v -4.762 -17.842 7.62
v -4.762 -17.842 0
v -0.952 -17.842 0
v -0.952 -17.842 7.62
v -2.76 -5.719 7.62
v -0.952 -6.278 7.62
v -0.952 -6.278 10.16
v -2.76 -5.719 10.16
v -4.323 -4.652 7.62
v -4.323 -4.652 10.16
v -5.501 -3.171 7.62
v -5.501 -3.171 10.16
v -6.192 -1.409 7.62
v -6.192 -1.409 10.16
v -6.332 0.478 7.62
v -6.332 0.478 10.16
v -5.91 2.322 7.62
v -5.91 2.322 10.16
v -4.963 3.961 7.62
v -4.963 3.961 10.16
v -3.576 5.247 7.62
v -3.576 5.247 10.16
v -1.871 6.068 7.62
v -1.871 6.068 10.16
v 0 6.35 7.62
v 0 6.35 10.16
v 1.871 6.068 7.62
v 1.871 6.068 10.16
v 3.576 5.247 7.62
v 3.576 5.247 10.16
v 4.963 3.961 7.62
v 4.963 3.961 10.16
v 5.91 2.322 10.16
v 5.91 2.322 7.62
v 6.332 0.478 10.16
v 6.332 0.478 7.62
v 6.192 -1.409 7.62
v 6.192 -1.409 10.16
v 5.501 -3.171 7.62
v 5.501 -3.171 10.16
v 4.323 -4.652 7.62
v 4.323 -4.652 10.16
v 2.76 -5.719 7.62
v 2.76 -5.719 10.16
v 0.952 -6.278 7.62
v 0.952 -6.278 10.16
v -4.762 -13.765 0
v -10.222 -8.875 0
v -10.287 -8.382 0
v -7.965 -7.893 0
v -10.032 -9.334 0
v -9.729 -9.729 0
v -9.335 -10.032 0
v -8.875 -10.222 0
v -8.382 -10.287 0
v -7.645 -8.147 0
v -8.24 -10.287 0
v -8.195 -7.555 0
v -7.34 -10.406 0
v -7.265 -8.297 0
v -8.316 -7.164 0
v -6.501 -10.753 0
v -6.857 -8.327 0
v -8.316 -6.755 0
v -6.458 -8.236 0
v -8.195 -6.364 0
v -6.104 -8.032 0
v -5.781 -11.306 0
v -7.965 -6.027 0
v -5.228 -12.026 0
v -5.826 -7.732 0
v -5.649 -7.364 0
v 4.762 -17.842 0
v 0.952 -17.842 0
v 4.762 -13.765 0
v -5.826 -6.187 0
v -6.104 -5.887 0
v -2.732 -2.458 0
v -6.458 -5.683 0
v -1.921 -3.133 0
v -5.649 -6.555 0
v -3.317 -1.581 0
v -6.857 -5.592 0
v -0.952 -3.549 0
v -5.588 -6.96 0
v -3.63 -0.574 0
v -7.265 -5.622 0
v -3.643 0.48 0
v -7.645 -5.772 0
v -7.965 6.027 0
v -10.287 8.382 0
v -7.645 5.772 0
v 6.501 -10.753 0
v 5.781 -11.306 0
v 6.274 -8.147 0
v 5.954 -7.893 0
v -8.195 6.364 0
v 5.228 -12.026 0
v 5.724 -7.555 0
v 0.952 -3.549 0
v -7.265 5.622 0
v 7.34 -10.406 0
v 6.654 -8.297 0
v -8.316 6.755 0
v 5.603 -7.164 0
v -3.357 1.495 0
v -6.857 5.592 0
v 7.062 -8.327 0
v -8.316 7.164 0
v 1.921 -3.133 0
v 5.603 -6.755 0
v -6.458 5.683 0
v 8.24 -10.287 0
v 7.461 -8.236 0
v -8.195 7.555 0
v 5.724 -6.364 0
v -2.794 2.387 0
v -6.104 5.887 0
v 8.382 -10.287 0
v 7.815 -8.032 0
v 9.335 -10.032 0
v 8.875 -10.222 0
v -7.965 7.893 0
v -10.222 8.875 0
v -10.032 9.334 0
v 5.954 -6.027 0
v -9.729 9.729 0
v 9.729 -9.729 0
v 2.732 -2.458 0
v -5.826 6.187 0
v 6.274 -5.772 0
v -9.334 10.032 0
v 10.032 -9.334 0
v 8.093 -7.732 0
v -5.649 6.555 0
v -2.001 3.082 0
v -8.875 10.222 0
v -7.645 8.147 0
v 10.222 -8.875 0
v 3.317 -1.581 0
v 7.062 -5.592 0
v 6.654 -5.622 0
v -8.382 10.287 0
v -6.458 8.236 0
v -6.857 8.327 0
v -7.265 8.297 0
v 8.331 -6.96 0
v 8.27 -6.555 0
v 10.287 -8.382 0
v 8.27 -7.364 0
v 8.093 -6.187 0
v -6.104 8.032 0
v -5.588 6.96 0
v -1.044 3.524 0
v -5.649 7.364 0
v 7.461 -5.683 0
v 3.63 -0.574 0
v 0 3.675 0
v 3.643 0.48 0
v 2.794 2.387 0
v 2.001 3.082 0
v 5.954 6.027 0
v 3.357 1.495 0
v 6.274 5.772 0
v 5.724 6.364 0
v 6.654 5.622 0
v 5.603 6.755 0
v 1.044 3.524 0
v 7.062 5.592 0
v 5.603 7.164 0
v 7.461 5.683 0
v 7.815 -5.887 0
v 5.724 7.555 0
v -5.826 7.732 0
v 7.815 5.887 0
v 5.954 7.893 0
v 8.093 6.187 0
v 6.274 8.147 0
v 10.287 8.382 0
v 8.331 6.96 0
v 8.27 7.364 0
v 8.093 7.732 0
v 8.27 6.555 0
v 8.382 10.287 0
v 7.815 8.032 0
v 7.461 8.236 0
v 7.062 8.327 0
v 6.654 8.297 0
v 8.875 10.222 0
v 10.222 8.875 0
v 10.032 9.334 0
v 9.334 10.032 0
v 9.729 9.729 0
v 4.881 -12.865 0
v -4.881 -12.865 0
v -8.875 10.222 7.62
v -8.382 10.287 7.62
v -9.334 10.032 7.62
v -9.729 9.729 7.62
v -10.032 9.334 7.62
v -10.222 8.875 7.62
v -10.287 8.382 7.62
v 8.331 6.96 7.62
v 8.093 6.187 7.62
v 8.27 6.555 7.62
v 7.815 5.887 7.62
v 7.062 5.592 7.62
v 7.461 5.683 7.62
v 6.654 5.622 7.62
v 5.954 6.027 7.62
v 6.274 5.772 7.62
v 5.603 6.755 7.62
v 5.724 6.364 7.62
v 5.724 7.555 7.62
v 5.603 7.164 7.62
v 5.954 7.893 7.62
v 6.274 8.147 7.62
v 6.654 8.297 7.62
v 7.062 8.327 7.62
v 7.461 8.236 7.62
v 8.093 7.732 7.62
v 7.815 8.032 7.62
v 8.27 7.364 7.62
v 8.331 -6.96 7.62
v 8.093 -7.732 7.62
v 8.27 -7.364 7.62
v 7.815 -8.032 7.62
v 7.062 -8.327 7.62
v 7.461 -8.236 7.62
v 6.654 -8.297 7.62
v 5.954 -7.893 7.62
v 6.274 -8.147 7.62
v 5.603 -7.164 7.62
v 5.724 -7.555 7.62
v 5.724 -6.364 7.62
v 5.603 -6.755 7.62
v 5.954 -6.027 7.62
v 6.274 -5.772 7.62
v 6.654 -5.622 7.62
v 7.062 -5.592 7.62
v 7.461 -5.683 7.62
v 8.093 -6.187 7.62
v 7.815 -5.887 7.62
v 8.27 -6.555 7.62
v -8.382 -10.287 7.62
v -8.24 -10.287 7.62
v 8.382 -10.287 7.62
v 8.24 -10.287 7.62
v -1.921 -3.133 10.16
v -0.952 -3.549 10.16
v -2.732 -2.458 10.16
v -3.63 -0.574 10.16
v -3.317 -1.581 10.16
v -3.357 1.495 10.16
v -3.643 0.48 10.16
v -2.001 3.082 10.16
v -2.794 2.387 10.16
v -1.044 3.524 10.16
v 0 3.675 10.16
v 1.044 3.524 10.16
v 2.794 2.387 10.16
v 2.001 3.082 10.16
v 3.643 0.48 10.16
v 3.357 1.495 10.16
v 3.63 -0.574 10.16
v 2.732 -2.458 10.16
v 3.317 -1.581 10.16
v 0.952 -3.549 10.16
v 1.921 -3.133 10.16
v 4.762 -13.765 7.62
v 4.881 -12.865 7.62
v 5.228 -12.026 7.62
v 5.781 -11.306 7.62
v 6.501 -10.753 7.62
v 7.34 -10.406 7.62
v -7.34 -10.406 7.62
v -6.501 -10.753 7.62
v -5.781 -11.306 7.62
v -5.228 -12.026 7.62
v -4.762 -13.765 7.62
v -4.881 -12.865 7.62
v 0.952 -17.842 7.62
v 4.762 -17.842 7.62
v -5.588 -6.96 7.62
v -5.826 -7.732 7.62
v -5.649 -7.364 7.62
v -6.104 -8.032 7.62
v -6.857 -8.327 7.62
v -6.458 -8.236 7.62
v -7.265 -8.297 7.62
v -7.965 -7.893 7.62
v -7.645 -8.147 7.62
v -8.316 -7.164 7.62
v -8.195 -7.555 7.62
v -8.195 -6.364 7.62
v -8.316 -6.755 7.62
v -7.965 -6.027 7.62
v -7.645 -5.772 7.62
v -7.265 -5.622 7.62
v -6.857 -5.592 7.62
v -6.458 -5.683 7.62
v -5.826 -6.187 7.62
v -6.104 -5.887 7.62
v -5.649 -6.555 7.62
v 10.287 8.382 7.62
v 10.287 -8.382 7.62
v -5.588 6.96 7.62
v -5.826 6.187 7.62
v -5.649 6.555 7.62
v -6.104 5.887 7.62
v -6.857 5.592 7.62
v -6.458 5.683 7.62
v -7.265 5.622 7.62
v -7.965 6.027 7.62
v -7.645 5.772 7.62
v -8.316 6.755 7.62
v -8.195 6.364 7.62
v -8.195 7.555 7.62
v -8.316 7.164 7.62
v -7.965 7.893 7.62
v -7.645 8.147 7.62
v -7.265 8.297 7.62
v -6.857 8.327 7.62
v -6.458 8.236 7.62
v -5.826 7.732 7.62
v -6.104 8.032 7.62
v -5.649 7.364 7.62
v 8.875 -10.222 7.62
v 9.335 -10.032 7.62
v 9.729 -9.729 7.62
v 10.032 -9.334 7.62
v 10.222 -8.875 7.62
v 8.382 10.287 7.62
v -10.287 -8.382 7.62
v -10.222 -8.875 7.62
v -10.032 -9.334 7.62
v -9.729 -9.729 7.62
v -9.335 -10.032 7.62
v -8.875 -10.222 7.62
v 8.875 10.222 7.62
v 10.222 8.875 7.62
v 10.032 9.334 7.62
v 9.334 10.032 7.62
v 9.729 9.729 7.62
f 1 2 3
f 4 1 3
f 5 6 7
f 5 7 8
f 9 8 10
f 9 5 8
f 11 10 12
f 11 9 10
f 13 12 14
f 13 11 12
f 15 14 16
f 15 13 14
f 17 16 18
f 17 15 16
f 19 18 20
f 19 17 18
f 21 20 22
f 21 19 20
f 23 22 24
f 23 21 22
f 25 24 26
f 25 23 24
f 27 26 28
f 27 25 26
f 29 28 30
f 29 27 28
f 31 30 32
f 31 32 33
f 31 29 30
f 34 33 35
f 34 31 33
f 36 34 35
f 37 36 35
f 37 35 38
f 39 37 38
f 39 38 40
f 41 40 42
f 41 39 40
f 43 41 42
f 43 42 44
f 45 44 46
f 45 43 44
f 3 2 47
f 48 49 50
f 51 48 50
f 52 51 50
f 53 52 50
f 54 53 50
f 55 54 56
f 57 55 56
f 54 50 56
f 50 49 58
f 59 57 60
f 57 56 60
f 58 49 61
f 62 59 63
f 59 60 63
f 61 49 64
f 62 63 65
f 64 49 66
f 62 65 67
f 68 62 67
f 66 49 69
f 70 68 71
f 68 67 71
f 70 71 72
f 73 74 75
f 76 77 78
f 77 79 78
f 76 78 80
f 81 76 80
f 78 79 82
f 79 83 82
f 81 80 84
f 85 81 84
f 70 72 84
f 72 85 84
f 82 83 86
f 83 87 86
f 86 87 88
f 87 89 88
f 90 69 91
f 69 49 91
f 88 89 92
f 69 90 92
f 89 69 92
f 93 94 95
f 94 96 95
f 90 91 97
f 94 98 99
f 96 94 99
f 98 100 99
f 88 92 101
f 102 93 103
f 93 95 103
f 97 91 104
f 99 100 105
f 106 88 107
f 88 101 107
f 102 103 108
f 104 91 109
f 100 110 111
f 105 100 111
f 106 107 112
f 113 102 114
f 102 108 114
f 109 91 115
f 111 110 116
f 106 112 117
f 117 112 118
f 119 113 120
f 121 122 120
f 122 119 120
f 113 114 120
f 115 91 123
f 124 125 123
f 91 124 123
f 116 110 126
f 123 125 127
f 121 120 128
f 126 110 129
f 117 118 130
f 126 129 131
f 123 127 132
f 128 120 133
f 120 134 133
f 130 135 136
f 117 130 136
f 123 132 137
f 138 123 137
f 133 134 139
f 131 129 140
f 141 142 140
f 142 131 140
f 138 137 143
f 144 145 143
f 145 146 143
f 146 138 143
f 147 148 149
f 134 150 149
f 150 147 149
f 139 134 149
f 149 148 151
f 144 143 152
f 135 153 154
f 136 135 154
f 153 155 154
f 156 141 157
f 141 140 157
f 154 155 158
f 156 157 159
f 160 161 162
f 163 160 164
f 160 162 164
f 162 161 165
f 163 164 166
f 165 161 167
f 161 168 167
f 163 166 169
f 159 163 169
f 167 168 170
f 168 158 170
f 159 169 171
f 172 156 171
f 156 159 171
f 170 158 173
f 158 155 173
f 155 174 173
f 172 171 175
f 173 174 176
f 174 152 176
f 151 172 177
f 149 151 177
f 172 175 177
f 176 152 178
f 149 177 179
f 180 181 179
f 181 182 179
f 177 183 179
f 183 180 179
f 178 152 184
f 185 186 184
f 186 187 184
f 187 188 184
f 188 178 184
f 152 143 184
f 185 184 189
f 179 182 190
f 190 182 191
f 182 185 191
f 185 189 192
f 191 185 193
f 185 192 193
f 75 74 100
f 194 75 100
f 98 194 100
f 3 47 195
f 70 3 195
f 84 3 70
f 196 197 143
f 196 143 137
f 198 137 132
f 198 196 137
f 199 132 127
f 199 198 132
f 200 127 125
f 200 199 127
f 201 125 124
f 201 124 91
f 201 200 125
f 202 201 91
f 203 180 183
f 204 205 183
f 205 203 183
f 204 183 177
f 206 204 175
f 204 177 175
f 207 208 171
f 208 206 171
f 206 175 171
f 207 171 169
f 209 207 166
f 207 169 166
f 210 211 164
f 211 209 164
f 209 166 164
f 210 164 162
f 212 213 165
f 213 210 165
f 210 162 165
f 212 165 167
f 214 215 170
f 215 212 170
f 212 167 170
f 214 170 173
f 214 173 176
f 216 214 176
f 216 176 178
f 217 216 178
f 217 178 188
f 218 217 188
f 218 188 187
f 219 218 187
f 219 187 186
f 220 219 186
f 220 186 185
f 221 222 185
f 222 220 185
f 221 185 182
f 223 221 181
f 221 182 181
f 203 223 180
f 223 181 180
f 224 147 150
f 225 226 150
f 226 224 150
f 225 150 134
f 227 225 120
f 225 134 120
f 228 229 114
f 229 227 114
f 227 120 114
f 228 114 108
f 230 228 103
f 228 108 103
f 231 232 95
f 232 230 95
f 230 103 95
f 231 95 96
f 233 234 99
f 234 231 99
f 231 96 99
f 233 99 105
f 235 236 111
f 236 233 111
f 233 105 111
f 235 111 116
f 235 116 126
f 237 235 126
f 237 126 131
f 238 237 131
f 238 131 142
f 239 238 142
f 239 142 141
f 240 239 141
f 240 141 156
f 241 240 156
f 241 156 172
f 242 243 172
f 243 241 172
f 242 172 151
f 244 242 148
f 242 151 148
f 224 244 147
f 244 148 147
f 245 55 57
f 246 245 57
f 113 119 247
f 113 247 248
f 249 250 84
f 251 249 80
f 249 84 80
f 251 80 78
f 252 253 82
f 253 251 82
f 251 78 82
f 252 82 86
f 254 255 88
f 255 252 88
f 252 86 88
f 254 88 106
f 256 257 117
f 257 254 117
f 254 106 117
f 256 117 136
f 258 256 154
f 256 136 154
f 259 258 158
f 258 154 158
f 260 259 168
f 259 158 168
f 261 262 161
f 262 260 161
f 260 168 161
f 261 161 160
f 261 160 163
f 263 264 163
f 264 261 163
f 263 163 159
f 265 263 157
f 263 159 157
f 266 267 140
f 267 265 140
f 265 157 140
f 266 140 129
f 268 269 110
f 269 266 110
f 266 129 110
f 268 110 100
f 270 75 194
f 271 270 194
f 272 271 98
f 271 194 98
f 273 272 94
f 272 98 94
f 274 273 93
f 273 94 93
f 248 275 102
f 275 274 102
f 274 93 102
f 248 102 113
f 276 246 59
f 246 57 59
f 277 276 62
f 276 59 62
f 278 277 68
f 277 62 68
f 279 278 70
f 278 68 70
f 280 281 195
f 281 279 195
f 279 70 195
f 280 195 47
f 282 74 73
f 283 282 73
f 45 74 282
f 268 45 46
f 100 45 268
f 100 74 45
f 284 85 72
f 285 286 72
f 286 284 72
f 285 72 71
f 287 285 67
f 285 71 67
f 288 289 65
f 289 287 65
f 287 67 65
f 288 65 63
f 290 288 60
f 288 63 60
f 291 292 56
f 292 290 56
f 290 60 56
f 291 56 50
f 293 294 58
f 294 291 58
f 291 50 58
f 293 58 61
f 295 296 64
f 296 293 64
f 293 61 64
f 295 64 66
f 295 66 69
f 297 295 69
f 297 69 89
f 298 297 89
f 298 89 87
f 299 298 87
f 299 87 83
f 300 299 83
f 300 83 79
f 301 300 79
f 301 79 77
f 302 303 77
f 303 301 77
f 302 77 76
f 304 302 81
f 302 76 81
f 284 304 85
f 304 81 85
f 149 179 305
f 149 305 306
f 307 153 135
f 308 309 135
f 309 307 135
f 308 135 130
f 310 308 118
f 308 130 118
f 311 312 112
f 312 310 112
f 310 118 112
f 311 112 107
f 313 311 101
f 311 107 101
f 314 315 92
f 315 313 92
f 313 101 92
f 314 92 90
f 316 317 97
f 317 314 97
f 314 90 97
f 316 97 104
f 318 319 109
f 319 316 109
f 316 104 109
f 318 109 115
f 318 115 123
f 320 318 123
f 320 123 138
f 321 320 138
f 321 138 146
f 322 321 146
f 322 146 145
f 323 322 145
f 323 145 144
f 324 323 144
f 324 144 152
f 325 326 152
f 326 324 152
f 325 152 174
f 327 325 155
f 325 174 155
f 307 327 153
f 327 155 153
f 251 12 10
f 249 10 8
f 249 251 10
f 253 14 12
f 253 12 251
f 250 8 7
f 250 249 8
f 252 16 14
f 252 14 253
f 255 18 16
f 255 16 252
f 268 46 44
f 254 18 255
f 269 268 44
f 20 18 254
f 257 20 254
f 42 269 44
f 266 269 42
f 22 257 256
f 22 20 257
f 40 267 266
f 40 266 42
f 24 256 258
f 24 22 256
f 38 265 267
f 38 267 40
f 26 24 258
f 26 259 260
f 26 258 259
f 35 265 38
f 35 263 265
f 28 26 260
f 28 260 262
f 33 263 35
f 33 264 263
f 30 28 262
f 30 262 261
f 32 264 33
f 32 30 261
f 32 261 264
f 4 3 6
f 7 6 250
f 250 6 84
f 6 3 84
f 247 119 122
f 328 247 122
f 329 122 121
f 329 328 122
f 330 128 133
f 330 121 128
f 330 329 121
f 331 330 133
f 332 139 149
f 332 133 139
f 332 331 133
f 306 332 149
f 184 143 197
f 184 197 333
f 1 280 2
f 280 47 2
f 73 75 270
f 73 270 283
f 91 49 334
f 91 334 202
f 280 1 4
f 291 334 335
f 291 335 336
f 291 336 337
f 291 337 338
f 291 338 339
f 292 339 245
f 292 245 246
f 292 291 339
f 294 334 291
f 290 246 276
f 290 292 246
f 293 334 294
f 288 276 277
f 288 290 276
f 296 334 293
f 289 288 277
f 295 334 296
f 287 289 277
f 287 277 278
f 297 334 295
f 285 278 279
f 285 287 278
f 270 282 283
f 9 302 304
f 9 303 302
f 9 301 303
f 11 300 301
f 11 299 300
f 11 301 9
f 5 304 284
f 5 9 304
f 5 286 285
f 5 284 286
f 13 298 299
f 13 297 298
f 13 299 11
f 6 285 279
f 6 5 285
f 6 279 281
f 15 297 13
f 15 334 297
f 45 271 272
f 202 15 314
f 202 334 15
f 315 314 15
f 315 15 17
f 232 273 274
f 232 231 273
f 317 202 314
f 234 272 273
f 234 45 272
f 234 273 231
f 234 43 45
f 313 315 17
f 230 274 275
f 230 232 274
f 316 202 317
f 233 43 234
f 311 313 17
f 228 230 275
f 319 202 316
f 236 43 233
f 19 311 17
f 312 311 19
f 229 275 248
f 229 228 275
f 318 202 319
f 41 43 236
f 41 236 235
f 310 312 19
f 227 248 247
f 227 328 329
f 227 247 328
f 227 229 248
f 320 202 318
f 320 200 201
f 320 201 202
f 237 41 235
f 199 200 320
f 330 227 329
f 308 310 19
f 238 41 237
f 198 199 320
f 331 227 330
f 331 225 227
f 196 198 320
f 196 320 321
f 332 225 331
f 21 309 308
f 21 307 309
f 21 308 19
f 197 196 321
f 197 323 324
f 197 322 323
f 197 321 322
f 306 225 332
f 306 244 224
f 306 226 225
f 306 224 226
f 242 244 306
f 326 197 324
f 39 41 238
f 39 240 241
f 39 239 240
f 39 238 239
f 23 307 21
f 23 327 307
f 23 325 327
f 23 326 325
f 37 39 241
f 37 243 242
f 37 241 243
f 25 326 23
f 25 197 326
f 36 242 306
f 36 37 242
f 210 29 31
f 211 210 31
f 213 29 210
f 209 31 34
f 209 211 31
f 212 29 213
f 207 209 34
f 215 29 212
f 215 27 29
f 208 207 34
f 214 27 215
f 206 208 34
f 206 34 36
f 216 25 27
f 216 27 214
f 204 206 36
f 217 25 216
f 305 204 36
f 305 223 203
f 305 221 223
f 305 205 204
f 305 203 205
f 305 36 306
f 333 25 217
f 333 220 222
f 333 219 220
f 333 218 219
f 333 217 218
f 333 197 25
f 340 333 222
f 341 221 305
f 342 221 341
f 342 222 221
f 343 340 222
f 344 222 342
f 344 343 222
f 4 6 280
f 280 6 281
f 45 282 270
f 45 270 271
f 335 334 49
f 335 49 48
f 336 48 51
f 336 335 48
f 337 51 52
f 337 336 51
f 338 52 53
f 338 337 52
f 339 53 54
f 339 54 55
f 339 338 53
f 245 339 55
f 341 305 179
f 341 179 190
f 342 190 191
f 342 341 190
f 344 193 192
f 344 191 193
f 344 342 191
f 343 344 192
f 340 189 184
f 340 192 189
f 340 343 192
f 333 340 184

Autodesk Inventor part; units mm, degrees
ref_plane "YZ Plane" through (0, 0, 0) normal (1, 0, 0) x (0, 1, 0)
ref_plane "XZ Plane" through (0, 0, 0) normal (0, 1, 0) x (-1, 0, 0)
ref_plane "XY Plane" through (0, 0, 0) normal (0, 0, 1) x (1, 0, 0)
sketch "Sketch1" plane through (0, 0, 0) normal (0, 0, 1) x (1, 0, 0)
  circle A0 centre (0, 0) radius 3.675
  circle A1 centre (0, 0) radius 6.35
  line L0 (-10.287, 10.287) -> (10.287, 10.287)
  line L1 (10.287, 10.287) -> (10.287, -10.287)
  line L2 (-10.287, -10.287) -> (-10.287, 10.287)
  line L3 (10.287, 10.287) -> (0, 10.287) construction
  circle A2 centre (-6.9596, 6.9596) radius 1.3716
  line L4 (-6.9596, 6.9596) -> (-10.287, 10.287) construction
  circle A3 centre (6.9596, 6.9596) radius 1.3716
  line L5 (6.9596, 6.9596) -> (10.287, 10.287) construction
  line L6 (-6.9596, 6.9596) -> (6.9596, 6.9596) construction
  circle A4 centre (-6.9596, -6.9596) radius 1.3716
  circle A5 centre (6.9596, -6.9596) radius 1.3716
  line L7 (-6.9596, 6.9596) -> (-6.9596, -6.9596) construction
  line L8 (-10.287, -10.287) -> (-8.2403, -10.287)
  line L9 (10.287, -10.287) -> (8.2403, -10.287)
  line L10 (21.5842, 10.287) -> (21.5842, 0) construction
  line L11 (21.5842, 0) -> (21.5842, -10.287) construction
  arc A6 (-4.7625, -13.7648) -> (-8.2403, -10.287) centre (-8.2403, -13.7648) ccw
  arc A7 (8.2403, -10.287) -> (4.7625, -13.7648) centre (8.2403, -13.7648) ccw
  line L12 (-4.7625, -13.7648) -> (-4.7625, -17.8424)
  line L13 (4.7625, -13.7648) -> (4.7625, -17.8424)
  line L14 (-4.7625, -17.8424) -> (4.7625, -17.8424)
  line L15 (0, -17.1877) -> (-4.7625, -17.1877) construction
  line L16 (0, -17.1877) -> (4.7625, -17.1877) construction
  point P0 (0, 10.287)
  dimension "d7" = 7.35
  dimension "d8" = 12.7
  dimension "d11" = 10.287
  dimension "d14" = 20.574
  dimension "d15" = 2.7432
  dimension "d16" = 45
  dimension "d18" = 2.7432
  dimension "d19" = 45
  dimension "d20" = 13.9192
  dimension "d21" = 2.7432
  dimension "d22" = 2.7432
  dimension "d23" = 13.9192
  dimension "d25" = 20.574
  dimension "d27" = 20.574
  dimension "d28" = 10.287
  dimension "d34" = 9.525
  dimension "d44" = 4.7625
extrude "Extrusion1" add sketch "Sketch1" along normal blind 7.62 contours A1 | L0 L1 L9 A7 L13 L14 L12 A6 L8 L2
sketch "Sketch2" plane through (0, 0, 7.62) normal (0, 0, 1) x (1, 0, 0)
  circle A0 centre (0, 0) radius 3.675 projected
  circle A1 centre (0, 0) radius 6.35
  dimension "d37" = 12.7
extrude "Extrusion2" add sketch "Sketch2" along normal blind 2.54
fillet "Fillet1" radius 1.905 1 edges at (10.287, 10.287, 3.81)
fillet "Fillet2" radius 1.905 1 edges at (-10.287, 10.287, 3.81)
fillet "Fillet3" radius 1.905 1 edges at (-10.287, -10.287, 3.81)
fillet "Fillet4" radius 1.905 1 edges at (10.287, -10.287, 3.81)
sketch "Sketch3" plane through (0, 0, 0) normal (0, 0, -1) x (-1, 0, 0)
  line L0 (-4.7625, -13.7648) -> (-4.7625, -17.8424) projected
  line L1 (-4.7625, -17.8424) -> (4.7625, -17.8424) projected
  line L2 (4.7625, -17.8424) -> (4.7625, -13.7648) projected
  line L3 (-10.287, 8.382) -> (-10.287, -8.382) projected
  circle A0 centre (0, 0) radius 3.675 projected
  line L4 (-4.7625, -17.8424) -> (-0.9525, -17.8424) construction
  line L5 (4.7625, -16.7338) -> (0.9525, -16.7338) construction
  line L6 (-0.9525, -17.8424) -> (-0.9525, -3.5494)
  line L7 (0.9525, -17.8424) -> (0.9525, -3.5494)
  line L8 (-0.9525, -17.8424) -> (0.9525, -17.8424)
  arc A1 (-0.9525, -3.5494) -> (0.9525, -3.5494) centre (0, 0) ccw
  dimension "d45" = 3.81
  dimension "d46" = 3.81
extrude "Extrusion3" cut sketch "Sketch3" against normal blind 10.16 contours L6 A0 L7 L1
equation "\"d11\" = 0.5 * d9"
equation "\"d14\" = d9"
equation "\"d18\" = d15"
equation "\"d19\" = d16"
equation "\"d21\" = d15"
equation "\"d22\" = d15"
equation "\"d23\" = d20"
equation "\"d25\" = d14"
equation "\"d27\" = d25"
equation "\"d28\" = 0.5 * d14"
equation "\"d44\" = 0.5 * d34"
equation "\"d46\" = d45"
equation "\"d9\" = 20.574"
properties part number "widget"
